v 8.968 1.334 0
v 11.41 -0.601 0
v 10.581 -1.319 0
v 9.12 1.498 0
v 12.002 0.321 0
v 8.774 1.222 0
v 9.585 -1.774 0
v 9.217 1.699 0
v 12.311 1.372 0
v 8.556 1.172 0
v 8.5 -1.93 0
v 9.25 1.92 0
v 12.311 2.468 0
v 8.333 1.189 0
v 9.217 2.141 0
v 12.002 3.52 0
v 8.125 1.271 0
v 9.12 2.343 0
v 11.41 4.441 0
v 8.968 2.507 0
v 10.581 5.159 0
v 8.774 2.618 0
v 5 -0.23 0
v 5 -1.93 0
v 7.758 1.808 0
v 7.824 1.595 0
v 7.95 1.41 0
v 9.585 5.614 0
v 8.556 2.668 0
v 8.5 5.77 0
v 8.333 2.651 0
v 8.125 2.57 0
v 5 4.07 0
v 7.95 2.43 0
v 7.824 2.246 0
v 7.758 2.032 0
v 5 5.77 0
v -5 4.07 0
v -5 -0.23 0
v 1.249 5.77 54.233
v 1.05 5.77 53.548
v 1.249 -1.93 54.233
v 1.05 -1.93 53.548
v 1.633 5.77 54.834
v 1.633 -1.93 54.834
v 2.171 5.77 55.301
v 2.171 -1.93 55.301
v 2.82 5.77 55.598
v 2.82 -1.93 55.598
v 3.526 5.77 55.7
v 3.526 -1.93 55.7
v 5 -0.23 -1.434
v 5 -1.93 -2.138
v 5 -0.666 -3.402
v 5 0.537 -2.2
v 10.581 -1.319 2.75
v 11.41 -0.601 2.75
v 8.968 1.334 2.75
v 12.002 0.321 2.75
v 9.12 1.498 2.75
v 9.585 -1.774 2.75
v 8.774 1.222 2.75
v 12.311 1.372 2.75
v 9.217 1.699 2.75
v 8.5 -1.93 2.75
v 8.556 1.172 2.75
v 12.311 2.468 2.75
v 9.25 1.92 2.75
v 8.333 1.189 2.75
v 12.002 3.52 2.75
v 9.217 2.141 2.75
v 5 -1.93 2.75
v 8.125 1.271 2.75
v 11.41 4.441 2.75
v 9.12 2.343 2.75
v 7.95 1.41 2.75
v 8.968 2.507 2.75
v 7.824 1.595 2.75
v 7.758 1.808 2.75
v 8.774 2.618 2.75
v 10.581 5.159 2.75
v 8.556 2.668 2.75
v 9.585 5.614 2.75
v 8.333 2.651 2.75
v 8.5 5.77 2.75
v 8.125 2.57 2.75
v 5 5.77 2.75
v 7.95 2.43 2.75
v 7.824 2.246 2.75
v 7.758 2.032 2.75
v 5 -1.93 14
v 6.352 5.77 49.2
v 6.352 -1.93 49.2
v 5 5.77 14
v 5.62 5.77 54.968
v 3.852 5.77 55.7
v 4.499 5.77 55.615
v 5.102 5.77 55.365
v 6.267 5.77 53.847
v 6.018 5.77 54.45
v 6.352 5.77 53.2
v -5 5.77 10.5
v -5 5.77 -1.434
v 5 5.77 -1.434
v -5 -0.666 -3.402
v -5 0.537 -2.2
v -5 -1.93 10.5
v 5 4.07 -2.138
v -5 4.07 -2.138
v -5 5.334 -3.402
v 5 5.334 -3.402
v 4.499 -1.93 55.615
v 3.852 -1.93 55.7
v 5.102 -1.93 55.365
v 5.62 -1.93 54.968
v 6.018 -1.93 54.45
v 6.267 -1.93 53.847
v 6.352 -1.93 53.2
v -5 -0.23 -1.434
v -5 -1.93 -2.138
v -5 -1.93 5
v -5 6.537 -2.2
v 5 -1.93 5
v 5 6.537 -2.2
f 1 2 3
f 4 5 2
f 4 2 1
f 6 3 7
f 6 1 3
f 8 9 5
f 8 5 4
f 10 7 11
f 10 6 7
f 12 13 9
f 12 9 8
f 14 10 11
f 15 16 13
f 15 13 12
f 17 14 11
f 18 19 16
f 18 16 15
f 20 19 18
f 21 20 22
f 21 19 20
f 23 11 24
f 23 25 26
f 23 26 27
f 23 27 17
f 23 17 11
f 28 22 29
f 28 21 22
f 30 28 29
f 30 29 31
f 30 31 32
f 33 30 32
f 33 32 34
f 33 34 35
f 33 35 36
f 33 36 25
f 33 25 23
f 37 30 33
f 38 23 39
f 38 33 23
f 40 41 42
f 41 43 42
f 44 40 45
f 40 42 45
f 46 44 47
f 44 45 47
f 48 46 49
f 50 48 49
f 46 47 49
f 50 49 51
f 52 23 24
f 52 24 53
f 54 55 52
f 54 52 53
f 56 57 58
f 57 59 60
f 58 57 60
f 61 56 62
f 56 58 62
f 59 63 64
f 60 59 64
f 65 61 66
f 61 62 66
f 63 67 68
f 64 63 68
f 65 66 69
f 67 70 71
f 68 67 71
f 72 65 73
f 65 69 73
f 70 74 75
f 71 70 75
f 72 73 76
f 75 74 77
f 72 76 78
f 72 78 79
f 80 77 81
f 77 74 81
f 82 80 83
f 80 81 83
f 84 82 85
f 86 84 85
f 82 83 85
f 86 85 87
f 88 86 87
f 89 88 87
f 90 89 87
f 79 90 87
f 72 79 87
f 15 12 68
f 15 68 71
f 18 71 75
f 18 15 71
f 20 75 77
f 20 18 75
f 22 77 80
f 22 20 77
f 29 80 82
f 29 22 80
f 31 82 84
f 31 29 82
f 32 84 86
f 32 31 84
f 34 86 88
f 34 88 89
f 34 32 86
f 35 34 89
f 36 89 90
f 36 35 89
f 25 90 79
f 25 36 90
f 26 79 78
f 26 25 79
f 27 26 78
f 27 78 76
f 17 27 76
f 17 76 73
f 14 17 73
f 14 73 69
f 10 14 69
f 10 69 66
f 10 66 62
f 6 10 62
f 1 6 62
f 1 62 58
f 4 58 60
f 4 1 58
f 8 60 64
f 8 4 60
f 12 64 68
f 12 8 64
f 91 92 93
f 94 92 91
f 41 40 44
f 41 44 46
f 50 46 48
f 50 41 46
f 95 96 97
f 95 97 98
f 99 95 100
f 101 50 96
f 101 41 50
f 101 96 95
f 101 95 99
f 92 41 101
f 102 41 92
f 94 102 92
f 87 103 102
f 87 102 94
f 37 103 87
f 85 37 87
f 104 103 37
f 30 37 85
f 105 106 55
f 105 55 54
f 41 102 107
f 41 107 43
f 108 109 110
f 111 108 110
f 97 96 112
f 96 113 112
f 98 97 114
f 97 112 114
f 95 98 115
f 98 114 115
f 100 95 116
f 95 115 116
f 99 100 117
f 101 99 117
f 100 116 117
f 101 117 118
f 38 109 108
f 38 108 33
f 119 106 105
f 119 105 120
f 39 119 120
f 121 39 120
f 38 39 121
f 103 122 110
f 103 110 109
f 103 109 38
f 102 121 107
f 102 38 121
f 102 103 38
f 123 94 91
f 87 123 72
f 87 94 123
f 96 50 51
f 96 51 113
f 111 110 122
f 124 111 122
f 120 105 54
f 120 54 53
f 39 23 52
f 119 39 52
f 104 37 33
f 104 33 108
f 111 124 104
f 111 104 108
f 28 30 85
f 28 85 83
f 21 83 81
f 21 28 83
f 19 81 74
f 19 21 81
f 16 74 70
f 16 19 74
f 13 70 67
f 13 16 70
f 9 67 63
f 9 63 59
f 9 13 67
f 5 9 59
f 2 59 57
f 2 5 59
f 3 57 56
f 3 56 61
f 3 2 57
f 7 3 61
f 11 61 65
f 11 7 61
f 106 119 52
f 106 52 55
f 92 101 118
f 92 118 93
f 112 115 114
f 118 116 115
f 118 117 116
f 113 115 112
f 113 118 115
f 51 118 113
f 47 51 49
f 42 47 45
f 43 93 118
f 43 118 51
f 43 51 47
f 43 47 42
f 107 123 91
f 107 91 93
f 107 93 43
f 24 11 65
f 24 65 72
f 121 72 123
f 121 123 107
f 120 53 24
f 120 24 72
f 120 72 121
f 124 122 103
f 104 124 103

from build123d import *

# Parameters (mm, degrees)
SKETCH2_W           = 10
SKETCH2_H           = 14.768412439
BOSS_EXTRUDE1_DEPTH = 5
BOSS_EXTRUDE4_DEPTH = 10
SKETCH9_W           = 10
SKETCH9_H           = 3.18
SKETCH9_H_2         = 3.888412439
CUT_EXTRUDE3_DEPTH  = 5
BOSS_EXTRUDE5_DEPTH = 7.7
SKETCH12_R          = 0.75
BOSS_EXTRUDE7_DEPTH = 2.75
FILLET1_R           = 2.5


with BuildPart() as part:
    # Sketch2 → Boss-Extrude1 (new body)
    with BuildSketch(Plane.XY):
        with Locations((0, 1.566049366)):
            Rectangle(SKETCH2_W, SKETCH2_H)
    extrude(amount=BOSS_EXTRUDE1_DEPTH)

    # Sketch8 → Boss-Extrude4 (add)
    with BuildSketch(Plane.ZY.offset(5)):
        Polygon((-0.15, 5.770255585), (0, 5.770255585), (0, 4.070255585), (-0.15, 4.070255585), (-2.137867966, 4.070255585), (-3.402081528, 5.334469147), (-2.2, 6.536550675), (-1.43370491, 5.770255585), align=None)
        Polygon((-0.15, -1.929744415), (0, -1.929744415), (0, -0.229744415), (-0.15, -0.229744415), (-1.43370491, -0.229744415), (-2.2, 0.536550675), (-3.402081528, -0.665530853), (-2.137867966, -1.929744415), align=None)
    extrude(amount=-BOSS_EXTRUDE4_DEPTH)

    # Sketch9 → Cut-Extrude3 (cut)
    with BuildSketch(Plane(origin=(0, 0, 0), x_dir=(-1, 0, 0), z_dir=(0, 0, -1))):
        with Locations((0, 7.360255585)):
            Rectangle(SKETCH9_W, SKETCH9_H)
        with Locations((0, -3.873950635)):
            Rectangle(SKETCH9_W, SKETCH9_H_2)
    extrude(amount=-CUT_EXTRUDE3_DEPTH, mode=Mode.SUBTRACT)

    # Sketch10 → Boss-Extrude5 (add)
    with BuildSketch(Plane(origin=(0, 5.770255585, 0), x_dir=(1, 0, 0), z_dir=(0, 1, 0))):
        Polygon((-5, -5), (-5, -10.5), (1.352445729, -55.7), (6.352445729, -55.7), (6.352445729, -49.2), (5, -14), (5, -5), align=None)
    extrude(amount=-BOSS_EXTRUDE5_DEPTH)

    # Sketch12 → Boss-Extrude7 (add)
    with BuildSketch(Plane.XY):
        with BuildLine():
            Line((5, 5.770255585), (8.5, 5.770255585))
            ThreePointArc((8.5, 5.770255585), (12.35, 1.920255585), (8.5, -1.929744415))
            Line((8.5, -1.929744415), (5, -1.929744415))
            Line((5, -1.929744415), (5, 5.770255585))
        make_face()
        with Locations((8.5, 1.920255585)):
            Circle(SKETCH12_R, mode=Mode.SUBTRACT)
    extrude(amount=BOSS_EXTRUDE7_DEPTH)

    # Fillet1
    fillet1_edges = [part.edges().sort_by_distance(p)[0] for p in [
        (6.352445729, 1.920255585, 49.2),
        (5, 1.920255585, 14),
        (1.352445729, 1.920255585, 55.7),
        (6.352445729, 1.920255585, 55.7),
    ]]
    fillet(fillet1_edges, radius=FILLET1_R)


solid = part.part
